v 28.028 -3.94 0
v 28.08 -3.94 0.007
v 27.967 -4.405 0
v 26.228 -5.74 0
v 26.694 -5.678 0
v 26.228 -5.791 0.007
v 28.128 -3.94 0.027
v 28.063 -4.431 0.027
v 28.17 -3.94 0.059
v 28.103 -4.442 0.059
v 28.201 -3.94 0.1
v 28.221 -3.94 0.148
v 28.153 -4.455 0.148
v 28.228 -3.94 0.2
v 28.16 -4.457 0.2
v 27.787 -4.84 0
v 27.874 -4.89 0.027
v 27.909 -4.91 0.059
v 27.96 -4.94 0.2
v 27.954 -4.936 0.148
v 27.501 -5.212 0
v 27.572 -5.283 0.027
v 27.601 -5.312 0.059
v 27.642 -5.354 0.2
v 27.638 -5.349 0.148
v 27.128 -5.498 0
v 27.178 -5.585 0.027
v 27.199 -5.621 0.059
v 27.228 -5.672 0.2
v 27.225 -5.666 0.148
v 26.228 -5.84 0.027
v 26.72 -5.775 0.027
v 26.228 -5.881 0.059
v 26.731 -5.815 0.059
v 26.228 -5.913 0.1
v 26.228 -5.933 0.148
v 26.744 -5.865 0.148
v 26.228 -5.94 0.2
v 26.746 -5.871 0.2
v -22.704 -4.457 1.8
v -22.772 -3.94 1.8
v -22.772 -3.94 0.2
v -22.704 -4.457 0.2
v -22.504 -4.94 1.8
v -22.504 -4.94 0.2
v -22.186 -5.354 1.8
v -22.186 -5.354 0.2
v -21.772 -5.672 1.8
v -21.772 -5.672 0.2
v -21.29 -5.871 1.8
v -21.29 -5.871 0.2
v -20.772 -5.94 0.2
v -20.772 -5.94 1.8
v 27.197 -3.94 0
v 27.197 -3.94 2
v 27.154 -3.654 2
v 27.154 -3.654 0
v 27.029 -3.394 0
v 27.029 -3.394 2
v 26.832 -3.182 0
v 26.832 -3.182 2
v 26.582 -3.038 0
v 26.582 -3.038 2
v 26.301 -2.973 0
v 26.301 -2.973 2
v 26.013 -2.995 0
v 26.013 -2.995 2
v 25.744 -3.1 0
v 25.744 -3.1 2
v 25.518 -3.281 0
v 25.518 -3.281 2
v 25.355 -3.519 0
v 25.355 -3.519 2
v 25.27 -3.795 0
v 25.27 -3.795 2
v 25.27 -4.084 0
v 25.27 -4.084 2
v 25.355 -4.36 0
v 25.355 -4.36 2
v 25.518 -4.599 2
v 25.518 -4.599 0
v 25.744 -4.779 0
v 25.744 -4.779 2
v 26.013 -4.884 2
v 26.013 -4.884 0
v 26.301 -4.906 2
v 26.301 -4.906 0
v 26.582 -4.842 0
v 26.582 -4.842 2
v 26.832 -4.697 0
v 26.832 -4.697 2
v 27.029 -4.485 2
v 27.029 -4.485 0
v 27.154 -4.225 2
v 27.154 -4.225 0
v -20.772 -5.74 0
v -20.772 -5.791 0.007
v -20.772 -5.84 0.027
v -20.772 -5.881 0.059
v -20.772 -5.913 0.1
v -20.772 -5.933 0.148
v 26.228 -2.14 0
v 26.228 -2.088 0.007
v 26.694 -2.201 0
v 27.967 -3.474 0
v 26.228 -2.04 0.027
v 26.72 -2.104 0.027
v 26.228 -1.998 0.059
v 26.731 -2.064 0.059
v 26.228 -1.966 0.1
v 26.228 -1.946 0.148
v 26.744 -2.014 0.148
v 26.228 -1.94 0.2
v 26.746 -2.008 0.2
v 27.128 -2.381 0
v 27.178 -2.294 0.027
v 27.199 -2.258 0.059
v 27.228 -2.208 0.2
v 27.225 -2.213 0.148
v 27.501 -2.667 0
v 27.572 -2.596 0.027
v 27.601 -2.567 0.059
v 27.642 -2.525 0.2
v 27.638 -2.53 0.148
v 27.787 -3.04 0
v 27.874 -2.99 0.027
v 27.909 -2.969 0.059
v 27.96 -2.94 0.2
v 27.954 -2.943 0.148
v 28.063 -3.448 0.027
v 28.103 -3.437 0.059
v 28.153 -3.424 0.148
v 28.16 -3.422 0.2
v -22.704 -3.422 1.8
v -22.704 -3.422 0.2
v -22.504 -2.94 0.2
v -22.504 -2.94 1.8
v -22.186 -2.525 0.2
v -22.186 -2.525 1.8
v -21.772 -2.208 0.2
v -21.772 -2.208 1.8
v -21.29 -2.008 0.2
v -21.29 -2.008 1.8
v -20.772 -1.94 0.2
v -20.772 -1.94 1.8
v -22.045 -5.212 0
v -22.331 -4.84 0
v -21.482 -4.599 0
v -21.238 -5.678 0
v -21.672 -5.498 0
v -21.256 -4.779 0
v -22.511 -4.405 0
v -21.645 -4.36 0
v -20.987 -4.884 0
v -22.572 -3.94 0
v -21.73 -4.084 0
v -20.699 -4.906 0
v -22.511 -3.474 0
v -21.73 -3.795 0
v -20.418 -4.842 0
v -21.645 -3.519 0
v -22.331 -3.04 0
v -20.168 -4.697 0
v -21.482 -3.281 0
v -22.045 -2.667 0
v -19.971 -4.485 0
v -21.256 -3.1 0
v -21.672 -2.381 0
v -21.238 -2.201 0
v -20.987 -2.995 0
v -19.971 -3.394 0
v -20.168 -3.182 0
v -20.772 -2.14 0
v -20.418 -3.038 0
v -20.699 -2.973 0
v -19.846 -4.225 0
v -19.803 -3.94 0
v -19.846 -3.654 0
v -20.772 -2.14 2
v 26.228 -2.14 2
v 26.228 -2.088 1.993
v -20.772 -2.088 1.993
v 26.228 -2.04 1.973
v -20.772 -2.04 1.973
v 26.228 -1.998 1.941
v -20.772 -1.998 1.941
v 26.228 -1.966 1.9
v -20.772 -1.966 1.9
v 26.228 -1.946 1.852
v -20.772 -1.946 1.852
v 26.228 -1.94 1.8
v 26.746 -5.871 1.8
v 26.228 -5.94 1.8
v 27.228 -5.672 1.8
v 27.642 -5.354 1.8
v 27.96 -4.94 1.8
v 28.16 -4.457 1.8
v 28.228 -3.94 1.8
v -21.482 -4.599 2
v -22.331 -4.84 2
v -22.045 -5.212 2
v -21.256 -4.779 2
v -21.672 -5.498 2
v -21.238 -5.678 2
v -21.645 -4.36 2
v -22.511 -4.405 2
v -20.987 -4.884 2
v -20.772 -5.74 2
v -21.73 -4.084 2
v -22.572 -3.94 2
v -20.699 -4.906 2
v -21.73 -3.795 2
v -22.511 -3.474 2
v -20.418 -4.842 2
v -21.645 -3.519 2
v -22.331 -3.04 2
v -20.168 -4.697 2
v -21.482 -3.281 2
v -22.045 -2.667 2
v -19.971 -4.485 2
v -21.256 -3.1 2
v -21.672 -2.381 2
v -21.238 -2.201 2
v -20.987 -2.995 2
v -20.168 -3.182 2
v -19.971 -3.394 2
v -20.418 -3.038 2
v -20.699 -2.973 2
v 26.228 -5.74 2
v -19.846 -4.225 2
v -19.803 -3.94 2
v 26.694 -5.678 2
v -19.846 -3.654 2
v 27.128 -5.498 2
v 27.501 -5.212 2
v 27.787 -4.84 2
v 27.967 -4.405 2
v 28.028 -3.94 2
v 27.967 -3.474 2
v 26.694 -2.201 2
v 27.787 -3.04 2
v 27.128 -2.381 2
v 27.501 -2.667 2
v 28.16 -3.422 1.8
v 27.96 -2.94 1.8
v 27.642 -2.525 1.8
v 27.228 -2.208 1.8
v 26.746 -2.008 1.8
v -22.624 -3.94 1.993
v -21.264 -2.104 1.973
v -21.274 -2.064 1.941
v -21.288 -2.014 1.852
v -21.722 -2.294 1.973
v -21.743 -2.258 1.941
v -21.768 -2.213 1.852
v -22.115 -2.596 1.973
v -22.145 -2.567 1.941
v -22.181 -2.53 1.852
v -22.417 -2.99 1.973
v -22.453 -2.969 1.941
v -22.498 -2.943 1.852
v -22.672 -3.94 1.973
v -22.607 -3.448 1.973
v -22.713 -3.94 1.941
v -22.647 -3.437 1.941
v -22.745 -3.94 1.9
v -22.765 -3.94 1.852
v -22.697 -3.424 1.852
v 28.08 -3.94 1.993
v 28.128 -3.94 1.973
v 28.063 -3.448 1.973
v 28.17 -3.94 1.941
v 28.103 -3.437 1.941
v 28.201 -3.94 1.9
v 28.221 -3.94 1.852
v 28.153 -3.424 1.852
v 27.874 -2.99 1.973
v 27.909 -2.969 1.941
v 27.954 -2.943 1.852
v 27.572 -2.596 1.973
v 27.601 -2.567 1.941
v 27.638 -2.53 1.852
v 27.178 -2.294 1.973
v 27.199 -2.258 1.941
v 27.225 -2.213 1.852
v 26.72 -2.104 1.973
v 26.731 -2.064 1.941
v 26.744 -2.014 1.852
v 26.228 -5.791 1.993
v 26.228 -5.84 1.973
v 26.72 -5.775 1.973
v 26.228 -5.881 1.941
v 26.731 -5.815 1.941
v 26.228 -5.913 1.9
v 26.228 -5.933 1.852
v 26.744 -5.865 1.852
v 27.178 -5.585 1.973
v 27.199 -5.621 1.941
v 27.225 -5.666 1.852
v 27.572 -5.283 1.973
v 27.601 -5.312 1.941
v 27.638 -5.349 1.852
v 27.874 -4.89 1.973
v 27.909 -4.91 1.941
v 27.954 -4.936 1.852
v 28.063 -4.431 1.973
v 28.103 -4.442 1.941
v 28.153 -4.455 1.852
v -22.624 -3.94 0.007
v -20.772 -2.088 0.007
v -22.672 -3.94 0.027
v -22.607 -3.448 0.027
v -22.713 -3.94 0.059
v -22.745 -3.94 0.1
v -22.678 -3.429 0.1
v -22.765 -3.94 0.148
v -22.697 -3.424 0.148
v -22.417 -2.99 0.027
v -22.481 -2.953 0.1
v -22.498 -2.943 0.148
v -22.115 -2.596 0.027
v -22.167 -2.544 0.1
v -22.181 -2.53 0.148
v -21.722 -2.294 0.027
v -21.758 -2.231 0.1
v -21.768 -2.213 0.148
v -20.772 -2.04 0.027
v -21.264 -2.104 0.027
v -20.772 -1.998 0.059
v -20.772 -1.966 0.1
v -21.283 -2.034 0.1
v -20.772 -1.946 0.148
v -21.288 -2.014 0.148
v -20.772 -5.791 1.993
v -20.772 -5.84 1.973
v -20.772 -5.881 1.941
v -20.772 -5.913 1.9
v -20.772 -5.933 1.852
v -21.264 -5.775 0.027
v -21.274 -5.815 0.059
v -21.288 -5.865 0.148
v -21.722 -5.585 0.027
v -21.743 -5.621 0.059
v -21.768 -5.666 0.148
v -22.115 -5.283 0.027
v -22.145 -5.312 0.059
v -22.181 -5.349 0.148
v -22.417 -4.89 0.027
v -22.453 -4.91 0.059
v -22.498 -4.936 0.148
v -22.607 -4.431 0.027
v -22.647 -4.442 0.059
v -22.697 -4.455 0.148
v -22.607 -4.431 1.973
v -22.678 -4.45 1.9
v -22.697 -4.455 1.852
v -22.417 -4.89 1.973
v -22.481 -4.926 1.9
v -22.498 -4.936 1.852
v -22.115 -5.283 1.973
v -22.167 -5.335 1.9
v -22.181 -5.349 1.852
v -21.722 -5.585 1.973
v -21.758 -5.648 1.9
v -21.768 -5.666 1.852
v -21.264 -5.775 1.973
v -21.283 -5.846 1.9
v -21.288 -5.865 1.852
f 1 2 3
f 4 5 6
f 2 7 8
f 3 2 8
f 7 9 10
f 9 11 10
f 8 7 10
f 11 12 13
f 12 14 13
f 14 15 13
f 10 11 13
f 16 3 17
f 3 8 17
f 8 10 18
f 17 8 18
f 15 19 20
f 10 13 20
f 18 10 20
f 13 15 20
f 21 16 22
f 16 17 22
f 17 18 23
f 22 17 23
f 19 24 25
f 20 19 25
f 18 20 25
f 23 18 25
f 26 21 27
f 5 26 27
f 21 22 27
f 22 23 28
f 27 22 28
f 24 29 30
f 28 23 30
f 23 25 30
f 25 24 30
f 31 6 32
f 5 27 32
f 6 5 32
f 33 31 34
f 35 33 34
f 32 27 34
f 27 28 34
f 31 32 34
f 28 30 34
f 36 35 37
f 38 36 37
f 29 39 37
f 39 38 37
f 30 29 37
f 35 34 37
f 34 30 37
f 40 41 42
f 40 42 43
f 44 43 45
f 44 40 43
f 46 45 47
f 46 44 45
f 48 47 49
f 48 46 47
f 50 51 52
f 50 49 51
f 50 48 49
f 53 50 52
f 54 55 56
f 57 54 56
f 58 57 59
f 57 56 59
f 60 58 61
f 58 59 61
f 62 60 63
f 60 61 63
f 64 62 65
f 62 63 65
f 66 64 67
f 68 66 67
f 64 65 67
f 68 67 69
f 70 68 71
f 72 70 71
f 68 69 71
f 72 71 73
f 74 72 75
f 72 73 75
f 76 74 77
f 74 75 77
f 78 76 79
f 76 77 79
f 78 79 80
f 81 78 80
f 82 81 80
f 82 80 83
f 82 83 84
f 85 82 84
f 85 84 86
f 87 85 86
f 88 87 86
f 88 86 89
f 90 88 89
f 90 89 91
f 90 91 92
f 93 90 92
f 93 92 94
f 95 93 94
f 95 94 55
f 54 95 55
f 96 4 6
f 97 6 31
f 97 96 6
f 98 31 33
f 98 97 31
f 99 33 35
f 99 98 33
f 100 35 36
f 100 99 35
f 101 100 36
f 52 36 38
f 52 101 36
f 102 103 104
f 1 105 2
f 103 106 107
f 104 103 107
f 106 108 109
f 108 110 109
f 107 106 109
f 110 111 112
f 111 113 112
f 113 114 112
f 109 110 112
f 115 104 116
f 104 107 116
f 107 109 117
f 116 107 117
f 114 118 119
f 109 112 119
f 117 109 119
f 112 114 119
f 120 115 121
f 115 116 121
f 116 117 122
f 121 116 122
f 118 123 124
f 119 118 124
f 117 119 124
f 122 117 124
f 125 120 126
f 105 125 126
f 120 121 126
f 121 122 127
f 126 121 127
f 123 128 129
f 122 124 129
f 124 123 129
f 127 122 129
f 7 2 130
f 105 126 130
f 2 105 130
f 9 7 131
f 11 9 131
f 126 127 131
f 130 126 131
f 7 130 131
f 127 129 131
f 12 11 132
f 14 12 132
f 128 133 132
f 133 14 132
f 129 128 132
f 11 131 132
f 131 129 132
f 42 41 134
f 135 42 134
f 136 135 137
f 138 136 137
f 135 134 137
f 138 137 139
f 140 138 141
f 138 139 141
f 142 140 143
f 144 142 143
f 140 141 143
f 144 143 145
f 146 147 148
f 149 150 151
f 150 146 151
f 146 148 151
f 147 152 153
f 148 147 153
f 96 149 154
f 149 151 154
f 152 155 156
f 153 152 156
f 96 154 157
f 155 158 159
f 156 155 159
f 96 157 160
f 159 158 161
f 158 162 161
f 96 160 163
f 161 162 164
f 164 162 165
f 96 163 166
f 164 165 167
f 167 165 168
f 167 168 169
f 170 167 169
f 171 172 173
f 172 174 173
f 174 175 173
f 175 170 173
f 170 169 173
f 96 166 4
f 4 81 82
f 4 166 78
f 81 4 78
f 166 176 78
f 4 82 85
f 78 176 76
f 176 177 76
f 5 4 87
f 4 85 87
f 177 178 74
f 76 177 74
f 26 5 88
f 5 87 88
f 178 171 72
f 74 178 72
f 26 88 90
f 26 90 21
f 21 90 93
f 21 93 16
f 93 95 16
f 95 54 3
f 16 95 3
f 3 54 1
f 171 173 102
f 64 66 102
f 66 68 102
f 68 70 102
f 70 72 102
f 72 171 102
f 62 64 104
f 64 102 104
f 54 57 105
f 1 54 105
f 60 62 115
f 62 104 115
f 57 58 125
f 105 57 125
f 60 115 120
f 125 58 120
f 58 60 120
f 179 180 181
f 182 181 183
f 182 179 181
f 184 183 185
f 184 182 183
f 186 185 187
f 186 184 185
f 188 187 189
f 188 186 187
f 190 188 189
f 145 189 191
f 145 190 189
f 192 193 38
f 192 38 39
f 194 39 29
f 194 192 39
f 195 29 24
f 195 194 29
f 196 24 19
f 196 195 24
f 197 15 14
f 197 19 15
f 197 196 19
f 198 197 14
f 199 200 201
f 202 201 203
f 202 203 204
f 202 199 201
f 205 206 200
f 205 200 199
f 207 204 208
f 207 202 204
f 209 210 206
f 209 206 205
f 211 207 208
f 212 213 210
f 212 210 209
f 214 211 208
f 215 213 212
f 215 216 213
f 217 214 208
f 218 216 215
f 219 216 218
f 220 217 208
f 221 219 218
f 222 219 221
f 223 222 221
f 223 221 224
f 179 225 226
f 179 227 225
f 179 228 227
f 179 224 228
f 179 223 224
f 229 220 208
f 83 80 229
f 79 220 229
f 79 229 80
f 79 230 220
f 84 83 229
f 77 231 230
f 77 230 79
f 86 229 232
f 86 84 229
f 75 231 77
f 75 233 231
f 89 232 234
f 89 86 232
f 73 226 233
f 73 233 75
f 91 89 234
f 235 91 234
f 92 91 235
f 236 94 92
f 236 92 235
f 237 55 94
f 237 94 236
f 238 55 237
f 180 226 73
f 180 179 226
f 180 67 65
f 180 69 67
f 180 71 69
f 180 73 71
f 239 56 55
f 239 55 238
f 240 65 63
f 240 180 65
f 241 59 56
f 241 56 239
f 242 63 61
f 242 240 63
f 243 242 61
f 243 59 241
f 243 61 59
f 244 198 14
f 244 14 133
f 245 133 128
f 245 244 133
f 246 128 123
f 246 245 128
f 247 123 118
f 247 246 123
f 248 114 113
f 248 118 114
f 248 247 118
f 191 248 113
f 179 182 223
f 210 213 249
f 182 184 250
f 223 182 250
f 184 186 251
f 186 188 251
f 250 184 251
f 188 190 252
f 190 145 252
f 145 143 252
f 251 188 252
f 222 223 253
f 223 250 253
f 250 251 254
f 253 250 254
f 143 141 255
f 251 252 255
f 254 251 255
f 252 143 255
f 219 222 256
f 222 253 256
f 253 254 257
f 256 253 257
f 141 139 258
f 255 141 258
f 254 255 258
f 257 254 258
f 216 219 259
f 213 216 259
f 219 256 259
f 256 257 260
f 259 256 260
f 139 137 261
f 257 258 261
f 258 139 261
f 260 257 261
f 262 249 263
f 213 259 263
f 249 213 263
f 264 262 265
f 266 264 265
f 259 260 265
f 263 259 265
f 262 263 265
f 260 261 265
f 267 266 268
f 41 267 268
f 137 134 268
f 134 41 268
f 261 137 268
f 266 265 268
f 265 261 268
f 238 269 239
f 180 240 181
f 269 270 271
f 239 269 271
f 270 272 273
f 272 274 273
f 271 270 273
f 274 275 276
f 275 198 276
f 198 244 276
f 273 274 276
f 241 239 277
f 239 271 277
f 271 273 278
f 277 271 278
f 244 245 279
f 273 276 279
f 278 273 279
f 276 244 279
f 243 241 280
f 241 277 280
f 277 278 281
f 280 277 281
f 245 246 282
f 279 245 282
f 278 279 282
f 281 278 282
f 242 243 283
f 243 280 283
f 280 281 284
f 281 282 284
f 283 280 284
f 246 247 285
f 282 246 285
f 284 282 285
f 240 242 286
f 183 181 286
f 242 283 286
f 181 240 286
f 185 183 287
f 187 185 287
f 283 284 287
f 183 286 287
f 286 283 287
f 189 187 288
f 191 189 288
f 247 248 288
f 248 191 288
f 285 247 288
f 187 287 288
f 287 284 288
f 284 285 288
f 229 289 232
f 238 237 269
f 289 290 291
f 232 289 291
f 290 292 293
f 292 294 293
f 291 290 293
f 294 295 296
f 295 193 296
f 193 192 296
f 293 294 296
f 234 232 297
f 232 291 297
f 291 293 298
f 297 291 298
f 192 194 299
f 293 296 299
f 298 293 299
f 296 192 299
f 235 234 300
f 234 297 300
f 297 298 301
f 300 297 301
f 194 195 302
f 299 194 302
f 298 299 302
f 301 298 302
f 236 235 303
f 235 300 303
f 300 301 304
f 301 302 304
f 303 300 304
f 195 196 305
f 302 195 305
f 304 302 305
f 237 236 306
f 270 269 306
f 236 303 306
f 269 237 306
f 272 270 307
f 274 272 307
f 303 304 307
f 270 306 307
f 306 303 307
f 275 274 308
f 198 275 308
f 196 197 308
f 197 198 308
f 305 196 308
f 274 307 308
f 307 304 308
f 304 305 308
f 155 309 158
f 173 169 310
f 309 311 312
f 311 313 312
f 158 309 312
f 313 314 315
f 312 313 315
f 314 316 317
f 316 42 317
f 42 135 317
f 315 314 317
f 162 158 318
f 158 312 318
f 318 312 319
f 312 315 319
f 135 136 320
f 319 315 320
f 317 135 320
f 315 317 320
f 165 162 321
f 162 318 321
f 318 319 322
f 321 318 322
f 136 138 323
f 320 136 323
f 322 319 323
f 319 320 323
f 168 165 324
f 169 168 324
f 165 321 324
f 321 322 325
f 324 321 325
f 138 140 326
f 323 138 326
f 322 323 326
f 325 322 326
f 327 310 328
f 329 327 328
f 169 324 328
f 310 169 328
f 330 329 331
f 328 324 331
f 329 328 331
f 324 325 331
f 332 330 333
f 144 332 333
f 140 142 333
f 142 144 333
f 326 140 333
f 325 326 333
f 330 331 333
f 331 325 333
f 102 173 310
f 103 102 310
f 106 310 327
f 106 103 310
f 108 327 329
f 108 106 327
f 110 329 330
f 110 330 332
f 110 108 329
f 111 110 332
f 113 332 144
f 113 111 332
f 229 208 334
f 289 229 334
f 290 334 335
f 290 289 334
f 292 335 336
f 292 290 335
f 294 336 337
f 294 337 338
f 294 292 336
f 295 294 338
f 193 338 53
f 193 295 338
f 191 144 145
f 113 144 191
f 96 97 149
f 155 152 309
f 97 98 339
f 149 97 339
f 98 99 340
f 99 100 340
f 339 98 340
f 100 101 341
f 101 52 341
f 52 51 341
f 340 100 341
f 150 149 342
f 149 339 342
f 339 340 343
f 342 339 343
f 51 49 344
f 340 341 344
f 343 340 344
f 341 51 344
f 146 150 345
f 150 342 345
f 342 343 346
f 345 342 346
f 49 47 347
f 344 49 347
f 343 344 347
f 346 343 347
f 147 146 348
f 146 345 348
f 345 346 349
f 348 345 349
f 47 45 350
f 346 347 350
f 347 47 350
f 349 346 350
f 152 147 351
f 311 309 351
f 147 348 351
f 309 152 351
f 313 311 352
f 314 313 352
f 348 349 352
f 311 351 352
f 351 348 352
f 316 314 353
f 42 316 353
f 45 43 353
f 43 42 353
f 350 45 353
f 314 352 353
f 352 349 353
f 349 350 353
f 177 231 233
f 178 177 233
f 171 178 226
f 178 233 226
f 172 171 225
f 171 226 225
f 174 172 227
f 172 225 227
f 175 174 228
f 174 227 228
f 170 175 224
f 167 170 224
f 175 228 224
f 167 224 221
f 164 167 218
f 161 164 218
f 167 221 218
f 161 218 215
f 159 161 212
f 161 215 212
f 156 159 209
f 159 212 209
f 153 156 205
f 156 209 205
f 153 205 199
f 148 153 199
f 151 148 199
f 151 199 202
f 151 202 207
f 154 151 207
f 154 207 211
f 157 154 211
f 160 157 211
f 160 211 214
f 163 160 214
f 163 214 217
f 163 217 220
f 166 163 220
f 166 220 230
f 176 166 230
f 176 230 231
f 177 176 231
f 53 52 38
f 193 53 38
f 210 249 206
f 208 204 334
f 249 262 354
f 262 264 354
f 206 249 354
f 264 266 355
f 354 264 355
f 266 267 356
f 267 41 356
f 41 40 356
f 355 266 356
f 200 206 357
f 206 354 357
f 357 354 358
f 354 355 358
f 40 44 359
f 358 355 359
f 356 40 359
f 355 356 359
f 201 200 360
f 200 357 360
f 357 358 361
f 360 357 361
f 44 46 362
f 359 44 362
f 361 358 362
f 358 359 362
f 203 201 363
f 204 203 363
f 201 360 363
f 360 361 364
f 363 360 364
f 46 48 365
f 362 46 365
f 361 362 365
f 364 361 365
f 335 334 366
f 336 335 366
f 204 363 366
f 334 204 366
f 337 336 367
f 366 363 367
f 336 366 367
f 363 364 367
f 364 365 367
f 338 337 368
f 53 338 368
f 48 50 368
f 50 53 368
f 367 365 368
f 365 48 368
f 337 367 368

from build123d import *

# Parameters (mm, degrees)
F0_W     = 51
F0_H     = 4
F1_DEPTH = 2
F2_R     = 1.99999
F3_R     = 0.969
F4_DEPTH = 25
F5_R     = 0.2


# Not quite as in the source:
# - a fillet or chamfer is up to 0.001 mm smaller than in the source, because OpenCascade refuses the exact size


with BuildPart() as f1:
    # F0 (on Top) → F1 (new body)
    with BuildSketch(Plane.XY):
        with Locations((2.7281418443, -3.9396004599)):
            Rectangle(F0_W, F0_H)
    extrude(amount=F1_DEPTH)

    # F2 (radius 2 in the source; OpenCascade refuses exactly that, so slightly less here)
    f2_edges = [f1.edges().sort_by_distance(p)[0] for p in [
        (28.228142, -1.9396, 1),
        (28.228142, -5.9396, 1),
        (-22.771858, -1.9396, 1),
        (-22.771858, -5.9396, 1),
    ]]
    fillet(f2_edges, radius=F2_R)

    # F3 (on face) → F4 (cut)
    with BuildSketch(Plane.XY.offset(2)):
        with Locations((-20.7718581557, -3.9396004599)):
            Circle(F3_R)
        with Locations((26.2281418443, -3.9396004599)):
            Circle(F3_R)
    extrude(amount=-F4_DEPTH, mode=Mode.SUBTRACT)

    # F5
    f5_edges = [f1.edges().sort_by_distance(p)[0] for p in [
        (2.728142, -1.9396, 0),
        (2.728142, -5.9396, 2),
    ]]
    fillet(f5_edges, radius=F5_R)


solid = f1.part
